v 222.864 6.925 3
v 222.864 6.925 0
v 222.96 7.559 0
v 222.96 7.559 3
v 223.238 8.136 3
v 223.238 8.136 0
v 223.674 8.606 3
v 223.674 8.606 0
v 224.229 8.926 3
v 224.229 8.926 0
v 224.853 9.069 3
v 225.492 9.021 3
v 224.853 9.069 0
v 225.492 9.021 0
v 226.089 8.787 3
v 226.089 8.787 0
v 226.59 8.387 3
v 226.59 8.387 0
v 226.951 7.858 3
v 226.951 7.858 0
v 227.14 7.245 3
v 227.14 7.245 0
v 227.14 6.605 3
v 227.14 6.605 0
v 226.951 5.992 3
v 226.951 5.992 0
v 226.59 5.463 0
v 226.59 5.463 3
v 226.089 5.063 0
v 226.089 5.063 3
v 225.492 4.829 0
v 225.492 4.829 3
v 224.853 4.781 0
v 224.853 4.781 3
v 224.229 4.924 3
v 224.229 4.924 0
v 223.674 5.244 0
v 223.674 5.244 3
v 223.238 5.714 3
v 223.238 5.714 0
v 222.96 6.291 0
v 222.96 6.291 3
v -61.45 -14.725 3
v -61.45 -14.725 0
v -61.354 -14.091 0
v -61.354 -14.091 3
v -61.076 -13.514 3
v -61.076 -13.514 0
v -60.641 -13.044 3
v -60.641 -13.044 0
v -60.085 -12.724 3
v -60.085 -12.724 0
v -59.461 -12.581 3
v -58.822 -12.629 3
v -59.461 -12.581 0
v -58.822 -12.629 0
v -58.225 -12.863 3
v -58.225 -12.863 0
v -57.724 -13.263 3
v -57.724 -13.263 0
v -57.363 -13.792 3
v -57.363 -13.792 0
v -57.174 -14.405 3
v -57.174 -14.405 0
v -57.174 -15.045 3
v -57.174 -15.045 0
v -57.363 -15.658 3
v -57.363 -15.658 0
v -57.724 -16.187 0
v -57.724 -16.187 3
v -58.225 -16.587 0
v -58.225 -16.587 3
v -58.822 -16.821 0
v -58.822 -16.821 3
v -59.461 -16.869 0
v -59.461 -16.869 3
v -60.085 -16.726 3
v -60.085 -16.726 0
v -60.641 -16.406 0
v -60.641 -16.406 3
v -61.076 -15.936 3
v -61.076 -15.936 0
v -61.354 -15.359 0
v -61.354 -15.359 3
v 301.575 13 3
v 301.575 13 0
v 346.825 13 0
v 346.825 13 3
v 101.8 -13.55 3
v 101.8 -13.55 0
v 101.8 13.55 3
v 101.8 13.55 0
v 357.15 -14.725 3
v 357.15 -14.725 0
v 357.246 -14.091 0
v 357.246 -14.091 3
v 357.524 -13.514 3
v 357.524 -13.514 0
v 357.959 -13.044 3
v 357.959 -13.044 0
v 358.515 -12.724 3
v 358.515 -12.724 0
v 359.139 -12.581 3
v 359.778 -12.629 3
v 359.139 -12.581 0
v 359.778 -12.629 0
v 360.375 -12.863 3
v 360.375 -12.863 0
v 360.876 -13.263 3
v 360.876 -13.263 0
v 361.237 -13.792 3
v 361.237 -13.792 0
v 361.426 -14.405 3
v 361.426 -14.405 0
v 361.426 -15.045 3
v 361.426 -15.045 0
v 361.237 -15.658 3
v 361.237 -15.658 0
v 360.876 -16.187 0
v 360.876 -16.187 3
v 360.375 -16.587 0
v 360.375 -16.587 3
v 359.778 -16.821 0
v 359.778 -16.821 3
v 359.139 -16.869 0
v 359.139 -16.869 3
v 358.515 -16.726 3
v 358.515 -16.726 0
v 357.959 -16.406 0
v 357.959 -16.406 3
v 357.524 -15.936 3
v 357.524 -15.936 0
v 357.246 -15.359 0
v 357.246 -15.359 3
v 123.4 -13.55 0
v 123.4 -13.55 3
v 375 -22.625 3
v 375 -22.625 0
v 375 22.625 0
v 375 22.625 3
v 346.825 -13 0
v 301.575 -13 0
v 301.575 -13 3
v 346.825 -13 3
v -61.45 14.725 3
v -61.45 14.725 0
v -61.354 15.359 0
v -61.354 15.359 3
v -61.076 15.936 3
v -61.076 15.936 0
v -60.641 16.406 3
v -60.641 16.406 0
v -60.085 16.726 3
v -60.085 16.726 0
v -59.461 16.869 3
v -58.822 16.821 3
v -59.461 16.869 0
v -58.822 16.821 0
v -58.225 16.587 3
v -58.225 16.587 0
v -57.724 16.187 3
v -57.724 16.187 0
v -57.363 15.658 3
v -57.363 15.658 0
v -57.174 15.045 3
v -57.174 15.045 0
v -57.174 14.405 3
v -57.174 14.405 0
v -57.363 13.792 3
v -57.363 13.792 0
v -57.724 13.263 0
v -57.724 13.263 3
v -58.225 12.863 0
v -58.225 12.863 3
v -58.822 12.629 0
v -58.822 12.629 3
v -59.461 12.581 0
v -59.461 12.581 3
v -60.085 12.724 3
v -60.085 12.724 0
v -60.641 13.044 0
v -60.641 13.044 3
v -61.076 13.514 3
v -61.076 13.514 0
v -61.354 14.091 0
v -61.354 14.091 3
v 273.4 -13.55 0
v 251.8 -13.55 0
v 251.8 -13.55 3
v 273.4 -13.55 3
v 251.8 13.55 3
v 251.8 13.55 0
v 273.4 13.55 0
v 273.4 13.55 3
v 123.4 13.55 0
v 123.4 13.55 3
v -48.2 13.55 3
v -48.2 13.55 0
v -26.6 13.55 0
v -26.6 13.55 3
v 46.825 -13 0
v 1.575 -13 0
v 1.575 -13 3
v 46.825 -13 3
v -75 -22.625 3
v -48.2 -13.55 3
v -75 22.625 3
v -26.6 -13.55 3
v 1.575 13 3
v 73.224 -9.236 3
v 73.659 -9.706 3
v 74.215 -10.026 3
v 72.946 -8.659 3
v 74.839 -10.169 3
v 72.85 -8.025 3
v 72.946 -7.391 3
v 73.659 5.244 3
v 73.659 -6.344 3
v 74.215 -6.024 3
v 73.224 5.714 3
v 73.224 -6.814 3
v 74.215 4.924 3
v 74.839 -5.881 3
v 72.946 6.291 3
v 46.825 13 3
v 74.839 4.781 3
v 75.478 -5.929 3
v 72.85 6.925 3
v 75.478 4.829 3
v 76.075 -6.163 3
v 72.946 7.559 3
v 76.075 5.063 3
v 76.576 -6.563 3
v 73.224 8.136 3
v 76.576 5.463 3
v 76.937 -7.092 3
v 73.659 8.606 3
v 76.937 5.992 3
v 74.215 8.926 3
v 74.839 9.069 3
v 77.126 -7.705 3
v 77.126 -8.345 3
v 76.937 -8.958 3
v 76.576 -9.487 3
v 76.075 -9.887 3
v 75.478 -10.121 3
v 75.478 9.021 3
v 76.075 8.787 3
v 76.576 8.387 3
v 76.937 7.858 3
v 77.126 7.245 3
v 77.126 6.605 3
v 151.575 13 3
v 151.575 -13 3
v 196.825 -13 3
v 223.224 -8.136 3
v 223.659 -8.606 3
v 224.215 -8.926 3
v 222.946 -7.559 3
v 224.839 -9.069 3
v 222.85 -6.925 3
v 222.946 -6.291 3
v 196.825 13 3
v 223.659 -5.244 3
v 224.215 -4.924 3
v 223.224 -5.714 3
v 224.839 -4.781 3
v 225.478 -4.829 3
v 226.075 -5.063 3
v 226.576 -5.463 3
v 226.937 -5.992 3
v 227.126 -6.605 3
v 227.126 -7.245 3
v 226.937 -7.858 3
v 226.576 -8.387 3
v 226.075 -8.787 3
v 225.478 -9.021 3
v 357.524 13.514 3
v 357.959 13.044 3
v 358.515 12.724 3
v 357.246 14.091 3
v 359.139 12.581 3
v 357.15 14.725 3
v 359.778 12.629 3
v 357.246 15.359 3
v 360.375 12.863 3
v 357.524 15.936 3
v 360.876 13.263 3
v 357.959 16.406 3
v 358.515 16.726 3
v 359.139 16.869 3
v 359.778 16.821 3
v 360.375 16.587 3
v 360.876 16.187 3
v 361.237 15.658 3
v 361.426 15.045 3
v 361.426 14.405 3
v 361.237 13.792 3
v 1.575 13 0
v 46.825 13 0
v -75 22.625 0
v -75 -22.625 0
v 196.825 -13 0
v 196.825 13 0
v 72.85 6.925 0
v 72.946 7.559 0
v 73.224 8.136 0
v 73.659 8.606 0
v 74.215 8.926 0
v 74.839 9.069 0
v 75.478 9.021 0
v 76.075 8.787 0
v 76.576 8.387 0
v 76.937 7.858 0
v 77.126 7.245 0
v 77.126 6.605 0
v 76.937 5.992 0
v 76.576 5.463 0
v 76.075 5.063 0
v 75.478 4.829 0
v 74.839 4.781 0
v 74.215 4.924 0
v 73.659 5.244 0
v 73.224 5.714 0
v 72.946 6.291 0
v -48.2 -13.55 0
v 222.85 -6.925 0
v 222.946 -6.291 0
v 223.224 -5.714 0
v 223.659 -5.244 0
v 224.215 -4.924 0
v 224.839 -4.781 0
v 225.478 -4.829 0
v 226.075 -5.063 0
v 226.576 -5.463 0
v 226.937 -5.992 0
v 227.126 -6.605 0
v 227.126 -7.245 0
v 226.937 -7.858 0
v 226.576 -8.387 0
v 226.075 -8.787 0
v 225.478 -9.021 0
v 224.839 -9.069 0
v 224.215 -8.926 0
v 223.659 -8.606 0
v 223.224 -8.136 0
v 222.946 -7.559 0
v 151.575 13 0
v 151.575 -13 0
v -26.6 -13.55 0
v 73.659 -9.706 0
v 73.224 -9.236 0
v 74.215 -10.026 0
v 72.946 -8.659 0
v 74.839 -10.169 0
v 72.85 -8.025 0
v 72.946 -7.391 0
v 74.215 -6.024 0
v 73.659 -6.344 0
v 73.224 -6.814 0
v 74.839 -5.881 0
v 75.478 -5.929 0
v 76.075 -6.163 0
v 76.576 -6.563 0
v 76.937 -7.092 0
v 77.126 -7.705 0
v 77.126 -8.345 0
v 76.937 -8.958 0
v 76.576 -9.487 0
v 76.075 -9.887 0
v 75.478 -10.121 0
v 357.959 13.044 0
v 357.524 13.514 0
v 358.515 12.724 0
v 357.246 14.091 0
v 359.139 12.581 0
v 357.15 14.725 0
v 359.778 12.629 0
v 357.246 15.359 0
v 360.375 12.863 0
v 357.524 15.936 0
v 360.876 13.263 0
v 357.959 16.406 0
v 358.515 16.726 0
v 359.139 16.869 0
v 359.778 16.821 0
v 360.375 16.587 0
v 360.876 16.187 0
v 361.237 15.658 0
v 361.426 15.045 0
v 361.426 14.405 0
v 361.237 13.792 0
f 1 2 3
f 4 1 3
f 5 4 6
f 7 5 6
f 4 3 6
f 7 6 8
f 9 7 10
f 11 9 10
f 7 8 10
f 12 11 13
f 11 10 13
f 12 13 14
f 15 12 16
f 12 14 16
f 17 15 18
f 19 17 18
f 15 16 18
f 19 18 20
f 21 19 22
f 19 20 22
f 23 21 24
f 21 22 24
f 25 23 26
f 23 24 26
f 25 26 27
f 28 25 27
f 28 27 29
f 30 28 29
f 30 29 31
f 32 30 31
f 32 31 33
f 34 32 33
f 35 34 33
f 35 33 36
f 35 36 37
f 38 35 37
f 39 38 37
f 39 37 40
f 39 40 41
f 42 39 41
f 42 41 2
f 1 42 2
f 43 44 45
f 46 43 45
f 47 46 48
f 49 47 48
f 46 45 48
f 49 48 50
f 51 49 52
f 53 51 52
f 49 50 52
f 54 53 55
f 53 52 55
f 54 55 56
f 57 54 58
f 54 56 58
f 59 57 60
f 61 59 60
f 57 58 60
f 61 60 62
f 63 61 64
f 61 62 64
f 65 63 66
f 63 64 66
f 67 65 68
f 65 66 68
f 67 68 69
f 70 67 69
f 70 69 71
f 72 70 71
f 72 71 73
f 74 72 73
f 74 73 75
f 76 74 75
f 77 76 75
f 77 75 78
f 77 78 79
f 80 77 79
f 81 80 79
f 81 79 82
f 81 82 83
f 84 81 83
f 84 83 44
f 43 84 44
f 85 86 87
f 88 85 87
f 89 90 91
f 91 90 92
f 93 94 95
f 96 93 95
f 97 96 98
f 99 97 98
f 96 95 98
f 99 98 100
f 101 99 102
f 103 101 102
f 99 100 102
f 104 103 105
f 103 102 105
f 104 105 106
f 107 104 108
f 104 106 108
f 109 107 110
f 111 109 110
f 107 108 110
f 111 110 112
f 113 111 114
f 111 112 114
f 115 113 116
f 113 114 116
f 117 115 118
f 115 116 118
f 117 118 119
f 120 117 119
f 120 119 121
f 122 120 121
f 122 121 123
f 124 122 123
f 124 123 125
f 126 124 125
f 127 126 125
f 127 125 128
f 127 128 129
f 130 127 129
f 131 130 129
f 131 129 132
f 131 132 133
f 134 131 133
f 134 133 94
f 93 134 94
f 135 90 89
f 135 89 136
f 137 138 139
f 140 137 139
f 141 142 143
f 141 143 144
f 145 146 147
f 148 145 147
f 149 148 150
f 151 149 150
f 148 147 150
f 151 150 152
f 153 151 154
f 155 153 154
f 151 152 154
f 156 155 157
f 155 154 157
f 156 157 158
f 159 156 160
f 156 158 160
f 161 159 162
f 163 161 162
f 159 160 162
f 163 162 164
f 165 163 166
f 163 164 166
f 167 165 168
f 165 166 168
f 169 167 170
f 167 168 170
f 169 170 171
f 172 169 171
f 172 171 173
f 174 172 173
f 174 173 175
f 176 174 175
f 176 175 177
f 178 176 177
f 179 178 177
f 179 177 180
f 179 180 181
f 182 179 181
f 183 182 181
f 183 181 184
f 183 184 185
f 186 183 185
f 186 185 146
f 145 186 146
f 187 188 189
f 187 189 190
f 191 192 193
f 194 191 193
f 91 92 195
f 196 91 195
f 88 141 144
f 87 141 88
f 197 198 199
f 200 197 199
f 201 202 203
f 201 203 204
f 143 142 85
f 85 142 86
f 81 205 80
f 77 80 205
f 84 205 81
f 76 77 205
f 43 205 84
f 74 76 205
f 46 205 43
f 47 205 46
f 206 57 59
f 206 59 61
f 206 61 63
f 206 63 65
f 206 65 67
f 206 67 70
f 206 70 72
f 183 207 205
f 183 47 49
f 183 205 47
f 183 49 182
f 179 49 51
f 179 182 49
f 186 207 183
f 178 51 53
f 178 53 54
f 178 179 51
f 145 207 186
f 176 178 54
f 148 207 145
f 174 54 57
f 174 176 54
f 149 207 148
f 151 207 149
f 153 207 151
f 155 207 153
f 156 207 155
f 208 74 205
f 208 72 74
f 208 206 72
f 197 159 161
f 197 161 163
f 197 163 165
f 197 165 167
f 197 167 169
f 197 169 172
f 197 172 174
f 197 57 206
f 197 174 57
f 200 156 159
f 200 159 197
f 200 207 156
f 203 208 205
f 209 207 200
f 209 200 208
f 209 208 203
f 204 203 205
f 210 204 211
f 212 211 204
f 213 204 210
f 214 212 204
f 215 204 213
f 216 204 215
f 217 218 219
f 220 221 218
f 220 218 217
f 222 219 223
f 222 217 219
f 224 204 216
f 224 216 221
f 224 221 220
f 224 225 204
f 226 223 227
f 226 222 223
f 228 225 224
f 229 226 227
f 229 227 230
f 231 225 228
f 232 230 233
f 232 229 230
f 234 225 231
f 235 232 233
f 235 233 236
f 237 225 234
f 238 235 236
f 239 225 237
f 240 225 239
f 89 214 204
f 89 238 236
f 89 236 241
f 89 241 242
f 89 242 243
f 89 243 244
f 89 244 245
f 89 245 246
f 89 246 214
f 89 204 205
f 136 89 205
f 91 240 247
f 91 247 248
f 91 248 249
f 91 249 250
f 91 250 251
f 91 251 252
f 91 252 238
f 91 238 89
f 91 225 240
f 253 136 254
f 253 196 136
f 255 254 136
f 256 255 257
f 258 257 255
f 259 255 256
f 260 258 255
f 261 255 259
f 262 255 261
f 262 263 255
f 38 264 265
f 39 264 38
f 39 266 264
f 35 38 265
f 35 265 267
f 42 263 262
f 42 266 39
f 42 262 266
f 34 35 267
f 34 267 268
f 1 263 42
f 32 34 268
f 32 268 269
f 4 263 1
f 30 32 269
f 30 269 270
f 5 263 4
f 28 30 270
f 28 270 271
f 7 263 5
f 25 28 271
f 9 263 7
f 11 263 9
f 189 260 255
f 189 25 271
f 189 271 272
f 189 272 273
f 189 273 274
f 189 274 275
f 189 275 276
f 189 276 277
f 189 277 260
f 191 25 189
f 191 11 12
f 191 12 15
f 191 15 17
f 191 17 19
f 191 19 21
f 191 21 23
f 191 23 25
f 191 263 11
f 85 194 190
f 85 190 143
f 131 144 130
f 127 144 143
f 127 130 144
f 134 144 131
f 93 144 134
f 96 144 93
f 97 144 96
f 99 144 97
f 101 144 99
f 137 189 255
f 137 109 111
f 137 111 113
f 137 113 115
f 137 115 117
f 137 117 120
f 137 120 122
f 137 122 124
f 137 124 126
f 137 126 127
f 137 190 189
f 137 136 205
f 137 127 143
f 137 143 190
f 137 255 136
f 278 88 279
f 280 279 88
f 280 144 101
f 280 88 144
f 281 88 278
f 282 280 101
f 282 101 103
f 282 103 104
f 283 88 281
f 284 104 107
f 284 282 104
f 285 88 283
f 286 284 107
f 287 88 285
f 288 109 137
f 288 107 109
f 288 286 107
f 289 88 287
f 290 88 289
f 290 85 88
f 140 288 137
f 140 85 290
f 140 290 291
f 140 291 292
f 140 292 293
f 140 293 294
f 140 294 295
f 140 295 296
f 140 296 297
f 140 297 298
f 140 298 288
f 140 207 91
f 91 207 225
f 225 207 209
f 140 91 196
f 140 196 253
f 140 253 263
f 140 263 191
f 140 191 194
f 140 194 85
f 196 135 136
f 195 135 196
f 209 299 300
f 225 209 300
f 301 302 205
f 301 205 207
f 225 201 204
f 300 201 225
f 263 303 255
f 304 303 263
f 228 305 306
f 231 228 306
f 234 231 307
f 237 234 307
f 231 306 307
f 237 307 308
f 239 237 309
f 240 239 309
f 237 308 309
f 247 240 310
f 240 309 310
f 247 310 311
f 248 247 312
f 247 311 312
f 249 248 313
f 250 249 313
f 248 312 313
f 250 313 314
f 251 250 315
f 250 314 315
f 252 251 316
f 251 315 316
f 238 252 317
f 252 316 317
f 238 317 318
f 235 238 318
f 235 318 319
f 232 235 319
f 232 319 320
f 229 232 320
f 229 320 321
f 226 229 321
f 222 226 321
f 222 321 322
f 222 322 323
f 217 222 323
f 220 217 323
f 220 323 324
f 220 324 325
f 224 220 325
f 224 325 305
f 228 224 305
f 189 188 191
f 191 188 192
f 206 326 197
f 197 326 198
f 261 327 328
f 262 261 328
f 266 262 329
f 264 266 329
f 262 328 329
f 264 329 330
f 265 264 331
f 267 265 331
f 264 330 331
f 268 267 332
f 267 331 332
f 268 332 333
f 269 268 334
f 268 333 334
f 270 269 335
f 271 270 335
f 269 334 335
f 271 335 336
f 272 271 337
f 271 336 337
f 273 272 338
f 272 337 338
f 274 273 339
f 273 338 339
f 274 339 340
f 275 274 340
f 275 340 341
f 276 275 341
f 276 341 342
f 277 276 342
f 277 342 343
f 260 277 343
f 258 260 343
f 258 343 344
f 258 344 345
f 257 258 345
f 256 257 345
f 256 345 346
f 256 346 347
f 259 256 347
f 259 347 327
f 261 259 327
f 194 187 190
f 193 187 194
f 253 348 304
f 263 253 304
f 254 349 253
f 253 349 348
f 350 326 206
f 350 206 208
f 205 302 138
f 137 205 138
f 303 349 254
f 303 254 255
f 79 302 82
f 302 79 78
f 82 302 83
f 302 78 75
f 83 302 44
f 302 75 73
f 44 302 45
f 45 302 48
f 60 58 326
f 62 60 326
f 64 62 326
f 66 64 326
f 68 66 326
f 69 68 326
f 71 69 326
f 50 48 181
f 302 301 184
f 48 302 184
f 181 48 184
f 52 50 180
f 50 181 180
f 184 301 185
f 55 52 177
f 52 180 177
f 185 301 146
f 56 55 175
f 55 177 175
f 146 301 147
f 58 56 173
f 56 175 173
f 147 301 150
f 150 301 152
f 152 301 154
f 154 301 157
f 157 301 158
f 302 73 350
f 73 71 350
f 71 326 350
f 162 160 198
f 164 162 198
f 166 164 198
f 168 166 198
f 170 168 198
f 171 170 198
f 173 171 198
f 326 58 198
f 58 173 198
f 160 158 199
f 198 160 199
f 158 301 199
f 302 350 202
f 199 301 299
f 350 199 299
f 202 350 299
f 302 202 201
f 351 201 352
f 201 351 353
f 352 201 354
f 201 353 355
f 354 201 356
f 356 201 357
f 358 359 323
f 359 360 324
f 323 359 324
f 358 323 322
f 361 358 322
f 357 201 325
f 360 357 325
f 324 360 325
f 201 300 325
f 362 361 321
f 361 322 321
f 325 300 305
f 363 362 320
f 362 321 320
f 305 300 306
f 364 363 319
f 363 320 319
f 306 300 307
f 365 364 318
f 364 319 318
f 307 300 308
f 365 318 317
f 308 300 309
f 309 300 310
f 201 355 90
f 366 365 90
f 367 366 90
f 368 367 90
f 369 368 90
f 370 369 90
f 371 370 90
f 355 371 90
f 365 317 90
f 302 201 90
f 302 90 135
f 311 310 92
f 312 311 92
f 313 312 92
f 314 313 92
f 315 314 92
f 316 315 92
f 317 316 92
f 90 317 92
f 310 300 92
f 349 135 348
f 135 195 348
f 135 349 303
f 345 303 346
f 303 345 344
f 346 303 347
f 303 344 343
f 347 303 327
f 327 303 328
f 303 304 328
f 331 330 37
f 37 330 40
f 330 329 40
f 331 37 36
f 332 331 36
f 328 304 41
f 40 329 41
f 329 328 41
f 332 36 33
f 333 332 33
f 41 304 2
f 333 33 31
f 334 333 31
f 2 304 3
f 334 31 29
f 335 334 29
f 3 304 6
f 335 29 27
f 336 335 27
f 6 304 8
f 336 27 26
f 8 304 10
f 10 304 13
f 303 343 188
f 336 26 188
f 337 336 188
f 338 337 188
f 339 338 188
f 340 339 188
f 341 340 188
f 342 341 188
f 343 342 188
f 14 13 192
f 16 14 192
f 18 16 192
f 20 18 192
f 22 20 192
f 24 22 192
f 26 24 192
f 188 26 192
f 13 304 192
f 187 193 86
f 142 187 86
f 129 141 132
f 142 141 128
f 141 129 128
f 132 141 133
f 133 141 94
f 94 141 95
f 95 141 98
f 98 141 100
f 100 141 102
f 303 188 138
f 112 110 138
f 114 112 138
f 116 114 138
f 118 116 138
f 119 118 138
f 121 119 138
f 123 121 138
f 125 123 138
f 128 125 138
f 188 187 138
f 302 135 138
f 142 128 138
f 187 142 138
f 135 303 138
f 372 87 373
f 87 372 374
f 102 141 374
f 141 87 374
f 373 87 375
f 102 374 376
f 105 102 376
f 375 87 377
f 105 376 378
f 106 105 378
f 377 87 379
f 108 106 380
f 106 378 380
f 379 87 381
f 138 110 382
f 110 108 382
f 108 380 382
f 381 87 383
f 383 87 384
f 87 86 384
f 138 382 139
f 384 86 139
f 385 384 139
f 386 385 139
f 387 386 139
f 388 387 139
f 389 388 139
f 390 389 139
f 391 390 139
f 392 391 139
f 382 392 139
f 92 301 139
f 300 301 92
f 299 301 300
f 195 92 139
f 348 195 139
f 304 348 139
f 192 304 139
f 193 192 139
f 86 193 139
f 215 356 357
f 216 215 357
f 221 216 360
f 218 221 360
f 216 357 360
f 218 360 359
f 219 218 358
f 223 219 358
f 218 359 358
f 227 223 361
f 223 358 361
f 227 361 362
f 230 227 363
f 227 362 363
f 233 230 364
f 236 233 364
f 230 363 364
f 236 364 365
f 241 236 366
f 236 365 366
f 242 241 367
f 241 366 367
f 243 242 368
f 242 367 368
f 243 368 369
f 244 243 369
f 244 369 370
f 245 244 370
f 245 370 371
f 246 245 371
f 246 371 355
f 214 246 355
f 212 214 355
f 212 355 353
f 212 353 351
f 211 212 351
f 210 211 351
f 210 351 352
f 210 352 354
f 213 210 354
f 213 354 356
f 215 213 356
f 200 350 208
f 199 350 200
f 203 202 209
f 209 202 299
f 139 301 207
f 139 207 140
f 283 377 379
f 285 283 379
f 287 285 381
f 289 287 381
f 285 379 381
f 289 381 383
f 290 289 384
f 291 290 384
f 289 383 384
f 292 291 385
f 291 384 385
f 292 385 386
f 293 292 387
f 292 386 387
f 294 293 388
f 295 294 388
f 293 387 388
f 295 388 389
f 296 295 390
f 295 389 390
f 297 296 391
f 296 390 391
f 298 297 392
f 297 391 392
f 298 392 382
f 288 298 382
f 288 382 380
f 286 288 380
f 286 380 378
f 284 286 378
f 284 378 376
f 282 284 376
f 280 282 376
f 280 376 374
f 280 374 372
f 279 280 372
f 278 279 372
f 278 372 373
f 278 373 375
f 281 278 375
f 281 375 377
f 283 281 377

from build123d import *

# Parameters (mm, degrees)
SKETCH_1_W          = 450
SKETCH_1_H          = 45.25
EXTRUDE_1_DEPTH     = 3
SKETCH_1_3_W        = 21.6
SKETCH_1_3_H        = 27.1
SKETCH_1_3_W_2      = 45.25
SKETCH_1_3_H_2      = 26
CUT_EXTRUDE_2_DEPTH = 3
SKETCH_2_R          = 2.15
CUT_EXTRUDE_3_DEPTH = 5
SKETCH_3_R          = 2.15
CUT_EXTRUDE_4_DEPTH = 5


with BuildPart() as part:
    # 草圖1 → 填料-伸長1 (new body)
    with BuildSketch(Plane.XY):
        with Locations((150, 0)):
            Rectangle(SKETCH_1_W, SKETCH_1_H)
    extrude(amount=EXTRUDE_1_DEPTH)

    # 草圖1<3> → 除料-伸長2 (cut)
    with BuildSketch(Plane.XY):
        with Locations((-37.4, 0)):
            Rectangle(SKETCH_1_3_W, SKETCH_1_3_H)
        with Locations((174.2, 0)):
            Rectangle(SKETCH_1_3_W_2, SKETCH_1_3_H_2)
        with Locations((24.2, 0)):
            Rectangle(SKETCH_1_3_W_2, SKETCH_1_3_H_2)
        with Locations((112.6, 0)):
            Rectangle(SKETCH_1_3_W, SKETCH_1_3_H)
        with Locations((324.2, 0)):
            Rectangle(SKETCH_1_3_W_2, SKETCH_1_3_H_2)
        with Locations((262.6, 0)):
            Rectangle(SKETCH_1_3_W, SKETCH_1_3_H)
    extrude(amount=CUT_EXTRUDE_2_DEPTH, mode=Mode.SUBTRACT)

    # 草圖2 → 除料-伸長3 (cut)
    with BuildSketch(Plane(origin=(0, 0, 0), x_dir=(-1, 0, 0), z_dir=(0, 0, -1))):
        with Locations((-359.3, 14.725)):
            Circle(SKETCH_2_R)
        with Locations((-359.3, -14.725)):
            Circle(SKETCH_2_R)
        with Locations((59.3, 14.725)):
            Circle(SKETCH_2_R)
        with Locations((59.3, -14.725)):
            Circle(SKETCH_2_R)
    extrude(amount=-CUT_EXTRUDE_3_DEPTH, mode=Mode.SUBTRACT)

    # 草圖3 → 除料-伸長4 (cut)
    with BuildSketch(Plane(origin=(0, 0, 0), x_dir=(-1, 0, 0), z_dir=(0, 0, -1))):
        with Locations((-225.014075293, 6.925)):
            Circle(SKETCH_3_R)
        with Locations((-225, -6.925)):
            Circle(SKETCH_3_R)
        with Locations((-75.000000001, 6.925)):
            Circle(SKETCH_3_R)
        with Locations((-75, -8.025)):
            Circle(SKETCH_3_R)
    extrude(amount=-CUT_EXTRUDE_4_DEPTH, mode=Mode.SUBTRACT)


solid = part.part
